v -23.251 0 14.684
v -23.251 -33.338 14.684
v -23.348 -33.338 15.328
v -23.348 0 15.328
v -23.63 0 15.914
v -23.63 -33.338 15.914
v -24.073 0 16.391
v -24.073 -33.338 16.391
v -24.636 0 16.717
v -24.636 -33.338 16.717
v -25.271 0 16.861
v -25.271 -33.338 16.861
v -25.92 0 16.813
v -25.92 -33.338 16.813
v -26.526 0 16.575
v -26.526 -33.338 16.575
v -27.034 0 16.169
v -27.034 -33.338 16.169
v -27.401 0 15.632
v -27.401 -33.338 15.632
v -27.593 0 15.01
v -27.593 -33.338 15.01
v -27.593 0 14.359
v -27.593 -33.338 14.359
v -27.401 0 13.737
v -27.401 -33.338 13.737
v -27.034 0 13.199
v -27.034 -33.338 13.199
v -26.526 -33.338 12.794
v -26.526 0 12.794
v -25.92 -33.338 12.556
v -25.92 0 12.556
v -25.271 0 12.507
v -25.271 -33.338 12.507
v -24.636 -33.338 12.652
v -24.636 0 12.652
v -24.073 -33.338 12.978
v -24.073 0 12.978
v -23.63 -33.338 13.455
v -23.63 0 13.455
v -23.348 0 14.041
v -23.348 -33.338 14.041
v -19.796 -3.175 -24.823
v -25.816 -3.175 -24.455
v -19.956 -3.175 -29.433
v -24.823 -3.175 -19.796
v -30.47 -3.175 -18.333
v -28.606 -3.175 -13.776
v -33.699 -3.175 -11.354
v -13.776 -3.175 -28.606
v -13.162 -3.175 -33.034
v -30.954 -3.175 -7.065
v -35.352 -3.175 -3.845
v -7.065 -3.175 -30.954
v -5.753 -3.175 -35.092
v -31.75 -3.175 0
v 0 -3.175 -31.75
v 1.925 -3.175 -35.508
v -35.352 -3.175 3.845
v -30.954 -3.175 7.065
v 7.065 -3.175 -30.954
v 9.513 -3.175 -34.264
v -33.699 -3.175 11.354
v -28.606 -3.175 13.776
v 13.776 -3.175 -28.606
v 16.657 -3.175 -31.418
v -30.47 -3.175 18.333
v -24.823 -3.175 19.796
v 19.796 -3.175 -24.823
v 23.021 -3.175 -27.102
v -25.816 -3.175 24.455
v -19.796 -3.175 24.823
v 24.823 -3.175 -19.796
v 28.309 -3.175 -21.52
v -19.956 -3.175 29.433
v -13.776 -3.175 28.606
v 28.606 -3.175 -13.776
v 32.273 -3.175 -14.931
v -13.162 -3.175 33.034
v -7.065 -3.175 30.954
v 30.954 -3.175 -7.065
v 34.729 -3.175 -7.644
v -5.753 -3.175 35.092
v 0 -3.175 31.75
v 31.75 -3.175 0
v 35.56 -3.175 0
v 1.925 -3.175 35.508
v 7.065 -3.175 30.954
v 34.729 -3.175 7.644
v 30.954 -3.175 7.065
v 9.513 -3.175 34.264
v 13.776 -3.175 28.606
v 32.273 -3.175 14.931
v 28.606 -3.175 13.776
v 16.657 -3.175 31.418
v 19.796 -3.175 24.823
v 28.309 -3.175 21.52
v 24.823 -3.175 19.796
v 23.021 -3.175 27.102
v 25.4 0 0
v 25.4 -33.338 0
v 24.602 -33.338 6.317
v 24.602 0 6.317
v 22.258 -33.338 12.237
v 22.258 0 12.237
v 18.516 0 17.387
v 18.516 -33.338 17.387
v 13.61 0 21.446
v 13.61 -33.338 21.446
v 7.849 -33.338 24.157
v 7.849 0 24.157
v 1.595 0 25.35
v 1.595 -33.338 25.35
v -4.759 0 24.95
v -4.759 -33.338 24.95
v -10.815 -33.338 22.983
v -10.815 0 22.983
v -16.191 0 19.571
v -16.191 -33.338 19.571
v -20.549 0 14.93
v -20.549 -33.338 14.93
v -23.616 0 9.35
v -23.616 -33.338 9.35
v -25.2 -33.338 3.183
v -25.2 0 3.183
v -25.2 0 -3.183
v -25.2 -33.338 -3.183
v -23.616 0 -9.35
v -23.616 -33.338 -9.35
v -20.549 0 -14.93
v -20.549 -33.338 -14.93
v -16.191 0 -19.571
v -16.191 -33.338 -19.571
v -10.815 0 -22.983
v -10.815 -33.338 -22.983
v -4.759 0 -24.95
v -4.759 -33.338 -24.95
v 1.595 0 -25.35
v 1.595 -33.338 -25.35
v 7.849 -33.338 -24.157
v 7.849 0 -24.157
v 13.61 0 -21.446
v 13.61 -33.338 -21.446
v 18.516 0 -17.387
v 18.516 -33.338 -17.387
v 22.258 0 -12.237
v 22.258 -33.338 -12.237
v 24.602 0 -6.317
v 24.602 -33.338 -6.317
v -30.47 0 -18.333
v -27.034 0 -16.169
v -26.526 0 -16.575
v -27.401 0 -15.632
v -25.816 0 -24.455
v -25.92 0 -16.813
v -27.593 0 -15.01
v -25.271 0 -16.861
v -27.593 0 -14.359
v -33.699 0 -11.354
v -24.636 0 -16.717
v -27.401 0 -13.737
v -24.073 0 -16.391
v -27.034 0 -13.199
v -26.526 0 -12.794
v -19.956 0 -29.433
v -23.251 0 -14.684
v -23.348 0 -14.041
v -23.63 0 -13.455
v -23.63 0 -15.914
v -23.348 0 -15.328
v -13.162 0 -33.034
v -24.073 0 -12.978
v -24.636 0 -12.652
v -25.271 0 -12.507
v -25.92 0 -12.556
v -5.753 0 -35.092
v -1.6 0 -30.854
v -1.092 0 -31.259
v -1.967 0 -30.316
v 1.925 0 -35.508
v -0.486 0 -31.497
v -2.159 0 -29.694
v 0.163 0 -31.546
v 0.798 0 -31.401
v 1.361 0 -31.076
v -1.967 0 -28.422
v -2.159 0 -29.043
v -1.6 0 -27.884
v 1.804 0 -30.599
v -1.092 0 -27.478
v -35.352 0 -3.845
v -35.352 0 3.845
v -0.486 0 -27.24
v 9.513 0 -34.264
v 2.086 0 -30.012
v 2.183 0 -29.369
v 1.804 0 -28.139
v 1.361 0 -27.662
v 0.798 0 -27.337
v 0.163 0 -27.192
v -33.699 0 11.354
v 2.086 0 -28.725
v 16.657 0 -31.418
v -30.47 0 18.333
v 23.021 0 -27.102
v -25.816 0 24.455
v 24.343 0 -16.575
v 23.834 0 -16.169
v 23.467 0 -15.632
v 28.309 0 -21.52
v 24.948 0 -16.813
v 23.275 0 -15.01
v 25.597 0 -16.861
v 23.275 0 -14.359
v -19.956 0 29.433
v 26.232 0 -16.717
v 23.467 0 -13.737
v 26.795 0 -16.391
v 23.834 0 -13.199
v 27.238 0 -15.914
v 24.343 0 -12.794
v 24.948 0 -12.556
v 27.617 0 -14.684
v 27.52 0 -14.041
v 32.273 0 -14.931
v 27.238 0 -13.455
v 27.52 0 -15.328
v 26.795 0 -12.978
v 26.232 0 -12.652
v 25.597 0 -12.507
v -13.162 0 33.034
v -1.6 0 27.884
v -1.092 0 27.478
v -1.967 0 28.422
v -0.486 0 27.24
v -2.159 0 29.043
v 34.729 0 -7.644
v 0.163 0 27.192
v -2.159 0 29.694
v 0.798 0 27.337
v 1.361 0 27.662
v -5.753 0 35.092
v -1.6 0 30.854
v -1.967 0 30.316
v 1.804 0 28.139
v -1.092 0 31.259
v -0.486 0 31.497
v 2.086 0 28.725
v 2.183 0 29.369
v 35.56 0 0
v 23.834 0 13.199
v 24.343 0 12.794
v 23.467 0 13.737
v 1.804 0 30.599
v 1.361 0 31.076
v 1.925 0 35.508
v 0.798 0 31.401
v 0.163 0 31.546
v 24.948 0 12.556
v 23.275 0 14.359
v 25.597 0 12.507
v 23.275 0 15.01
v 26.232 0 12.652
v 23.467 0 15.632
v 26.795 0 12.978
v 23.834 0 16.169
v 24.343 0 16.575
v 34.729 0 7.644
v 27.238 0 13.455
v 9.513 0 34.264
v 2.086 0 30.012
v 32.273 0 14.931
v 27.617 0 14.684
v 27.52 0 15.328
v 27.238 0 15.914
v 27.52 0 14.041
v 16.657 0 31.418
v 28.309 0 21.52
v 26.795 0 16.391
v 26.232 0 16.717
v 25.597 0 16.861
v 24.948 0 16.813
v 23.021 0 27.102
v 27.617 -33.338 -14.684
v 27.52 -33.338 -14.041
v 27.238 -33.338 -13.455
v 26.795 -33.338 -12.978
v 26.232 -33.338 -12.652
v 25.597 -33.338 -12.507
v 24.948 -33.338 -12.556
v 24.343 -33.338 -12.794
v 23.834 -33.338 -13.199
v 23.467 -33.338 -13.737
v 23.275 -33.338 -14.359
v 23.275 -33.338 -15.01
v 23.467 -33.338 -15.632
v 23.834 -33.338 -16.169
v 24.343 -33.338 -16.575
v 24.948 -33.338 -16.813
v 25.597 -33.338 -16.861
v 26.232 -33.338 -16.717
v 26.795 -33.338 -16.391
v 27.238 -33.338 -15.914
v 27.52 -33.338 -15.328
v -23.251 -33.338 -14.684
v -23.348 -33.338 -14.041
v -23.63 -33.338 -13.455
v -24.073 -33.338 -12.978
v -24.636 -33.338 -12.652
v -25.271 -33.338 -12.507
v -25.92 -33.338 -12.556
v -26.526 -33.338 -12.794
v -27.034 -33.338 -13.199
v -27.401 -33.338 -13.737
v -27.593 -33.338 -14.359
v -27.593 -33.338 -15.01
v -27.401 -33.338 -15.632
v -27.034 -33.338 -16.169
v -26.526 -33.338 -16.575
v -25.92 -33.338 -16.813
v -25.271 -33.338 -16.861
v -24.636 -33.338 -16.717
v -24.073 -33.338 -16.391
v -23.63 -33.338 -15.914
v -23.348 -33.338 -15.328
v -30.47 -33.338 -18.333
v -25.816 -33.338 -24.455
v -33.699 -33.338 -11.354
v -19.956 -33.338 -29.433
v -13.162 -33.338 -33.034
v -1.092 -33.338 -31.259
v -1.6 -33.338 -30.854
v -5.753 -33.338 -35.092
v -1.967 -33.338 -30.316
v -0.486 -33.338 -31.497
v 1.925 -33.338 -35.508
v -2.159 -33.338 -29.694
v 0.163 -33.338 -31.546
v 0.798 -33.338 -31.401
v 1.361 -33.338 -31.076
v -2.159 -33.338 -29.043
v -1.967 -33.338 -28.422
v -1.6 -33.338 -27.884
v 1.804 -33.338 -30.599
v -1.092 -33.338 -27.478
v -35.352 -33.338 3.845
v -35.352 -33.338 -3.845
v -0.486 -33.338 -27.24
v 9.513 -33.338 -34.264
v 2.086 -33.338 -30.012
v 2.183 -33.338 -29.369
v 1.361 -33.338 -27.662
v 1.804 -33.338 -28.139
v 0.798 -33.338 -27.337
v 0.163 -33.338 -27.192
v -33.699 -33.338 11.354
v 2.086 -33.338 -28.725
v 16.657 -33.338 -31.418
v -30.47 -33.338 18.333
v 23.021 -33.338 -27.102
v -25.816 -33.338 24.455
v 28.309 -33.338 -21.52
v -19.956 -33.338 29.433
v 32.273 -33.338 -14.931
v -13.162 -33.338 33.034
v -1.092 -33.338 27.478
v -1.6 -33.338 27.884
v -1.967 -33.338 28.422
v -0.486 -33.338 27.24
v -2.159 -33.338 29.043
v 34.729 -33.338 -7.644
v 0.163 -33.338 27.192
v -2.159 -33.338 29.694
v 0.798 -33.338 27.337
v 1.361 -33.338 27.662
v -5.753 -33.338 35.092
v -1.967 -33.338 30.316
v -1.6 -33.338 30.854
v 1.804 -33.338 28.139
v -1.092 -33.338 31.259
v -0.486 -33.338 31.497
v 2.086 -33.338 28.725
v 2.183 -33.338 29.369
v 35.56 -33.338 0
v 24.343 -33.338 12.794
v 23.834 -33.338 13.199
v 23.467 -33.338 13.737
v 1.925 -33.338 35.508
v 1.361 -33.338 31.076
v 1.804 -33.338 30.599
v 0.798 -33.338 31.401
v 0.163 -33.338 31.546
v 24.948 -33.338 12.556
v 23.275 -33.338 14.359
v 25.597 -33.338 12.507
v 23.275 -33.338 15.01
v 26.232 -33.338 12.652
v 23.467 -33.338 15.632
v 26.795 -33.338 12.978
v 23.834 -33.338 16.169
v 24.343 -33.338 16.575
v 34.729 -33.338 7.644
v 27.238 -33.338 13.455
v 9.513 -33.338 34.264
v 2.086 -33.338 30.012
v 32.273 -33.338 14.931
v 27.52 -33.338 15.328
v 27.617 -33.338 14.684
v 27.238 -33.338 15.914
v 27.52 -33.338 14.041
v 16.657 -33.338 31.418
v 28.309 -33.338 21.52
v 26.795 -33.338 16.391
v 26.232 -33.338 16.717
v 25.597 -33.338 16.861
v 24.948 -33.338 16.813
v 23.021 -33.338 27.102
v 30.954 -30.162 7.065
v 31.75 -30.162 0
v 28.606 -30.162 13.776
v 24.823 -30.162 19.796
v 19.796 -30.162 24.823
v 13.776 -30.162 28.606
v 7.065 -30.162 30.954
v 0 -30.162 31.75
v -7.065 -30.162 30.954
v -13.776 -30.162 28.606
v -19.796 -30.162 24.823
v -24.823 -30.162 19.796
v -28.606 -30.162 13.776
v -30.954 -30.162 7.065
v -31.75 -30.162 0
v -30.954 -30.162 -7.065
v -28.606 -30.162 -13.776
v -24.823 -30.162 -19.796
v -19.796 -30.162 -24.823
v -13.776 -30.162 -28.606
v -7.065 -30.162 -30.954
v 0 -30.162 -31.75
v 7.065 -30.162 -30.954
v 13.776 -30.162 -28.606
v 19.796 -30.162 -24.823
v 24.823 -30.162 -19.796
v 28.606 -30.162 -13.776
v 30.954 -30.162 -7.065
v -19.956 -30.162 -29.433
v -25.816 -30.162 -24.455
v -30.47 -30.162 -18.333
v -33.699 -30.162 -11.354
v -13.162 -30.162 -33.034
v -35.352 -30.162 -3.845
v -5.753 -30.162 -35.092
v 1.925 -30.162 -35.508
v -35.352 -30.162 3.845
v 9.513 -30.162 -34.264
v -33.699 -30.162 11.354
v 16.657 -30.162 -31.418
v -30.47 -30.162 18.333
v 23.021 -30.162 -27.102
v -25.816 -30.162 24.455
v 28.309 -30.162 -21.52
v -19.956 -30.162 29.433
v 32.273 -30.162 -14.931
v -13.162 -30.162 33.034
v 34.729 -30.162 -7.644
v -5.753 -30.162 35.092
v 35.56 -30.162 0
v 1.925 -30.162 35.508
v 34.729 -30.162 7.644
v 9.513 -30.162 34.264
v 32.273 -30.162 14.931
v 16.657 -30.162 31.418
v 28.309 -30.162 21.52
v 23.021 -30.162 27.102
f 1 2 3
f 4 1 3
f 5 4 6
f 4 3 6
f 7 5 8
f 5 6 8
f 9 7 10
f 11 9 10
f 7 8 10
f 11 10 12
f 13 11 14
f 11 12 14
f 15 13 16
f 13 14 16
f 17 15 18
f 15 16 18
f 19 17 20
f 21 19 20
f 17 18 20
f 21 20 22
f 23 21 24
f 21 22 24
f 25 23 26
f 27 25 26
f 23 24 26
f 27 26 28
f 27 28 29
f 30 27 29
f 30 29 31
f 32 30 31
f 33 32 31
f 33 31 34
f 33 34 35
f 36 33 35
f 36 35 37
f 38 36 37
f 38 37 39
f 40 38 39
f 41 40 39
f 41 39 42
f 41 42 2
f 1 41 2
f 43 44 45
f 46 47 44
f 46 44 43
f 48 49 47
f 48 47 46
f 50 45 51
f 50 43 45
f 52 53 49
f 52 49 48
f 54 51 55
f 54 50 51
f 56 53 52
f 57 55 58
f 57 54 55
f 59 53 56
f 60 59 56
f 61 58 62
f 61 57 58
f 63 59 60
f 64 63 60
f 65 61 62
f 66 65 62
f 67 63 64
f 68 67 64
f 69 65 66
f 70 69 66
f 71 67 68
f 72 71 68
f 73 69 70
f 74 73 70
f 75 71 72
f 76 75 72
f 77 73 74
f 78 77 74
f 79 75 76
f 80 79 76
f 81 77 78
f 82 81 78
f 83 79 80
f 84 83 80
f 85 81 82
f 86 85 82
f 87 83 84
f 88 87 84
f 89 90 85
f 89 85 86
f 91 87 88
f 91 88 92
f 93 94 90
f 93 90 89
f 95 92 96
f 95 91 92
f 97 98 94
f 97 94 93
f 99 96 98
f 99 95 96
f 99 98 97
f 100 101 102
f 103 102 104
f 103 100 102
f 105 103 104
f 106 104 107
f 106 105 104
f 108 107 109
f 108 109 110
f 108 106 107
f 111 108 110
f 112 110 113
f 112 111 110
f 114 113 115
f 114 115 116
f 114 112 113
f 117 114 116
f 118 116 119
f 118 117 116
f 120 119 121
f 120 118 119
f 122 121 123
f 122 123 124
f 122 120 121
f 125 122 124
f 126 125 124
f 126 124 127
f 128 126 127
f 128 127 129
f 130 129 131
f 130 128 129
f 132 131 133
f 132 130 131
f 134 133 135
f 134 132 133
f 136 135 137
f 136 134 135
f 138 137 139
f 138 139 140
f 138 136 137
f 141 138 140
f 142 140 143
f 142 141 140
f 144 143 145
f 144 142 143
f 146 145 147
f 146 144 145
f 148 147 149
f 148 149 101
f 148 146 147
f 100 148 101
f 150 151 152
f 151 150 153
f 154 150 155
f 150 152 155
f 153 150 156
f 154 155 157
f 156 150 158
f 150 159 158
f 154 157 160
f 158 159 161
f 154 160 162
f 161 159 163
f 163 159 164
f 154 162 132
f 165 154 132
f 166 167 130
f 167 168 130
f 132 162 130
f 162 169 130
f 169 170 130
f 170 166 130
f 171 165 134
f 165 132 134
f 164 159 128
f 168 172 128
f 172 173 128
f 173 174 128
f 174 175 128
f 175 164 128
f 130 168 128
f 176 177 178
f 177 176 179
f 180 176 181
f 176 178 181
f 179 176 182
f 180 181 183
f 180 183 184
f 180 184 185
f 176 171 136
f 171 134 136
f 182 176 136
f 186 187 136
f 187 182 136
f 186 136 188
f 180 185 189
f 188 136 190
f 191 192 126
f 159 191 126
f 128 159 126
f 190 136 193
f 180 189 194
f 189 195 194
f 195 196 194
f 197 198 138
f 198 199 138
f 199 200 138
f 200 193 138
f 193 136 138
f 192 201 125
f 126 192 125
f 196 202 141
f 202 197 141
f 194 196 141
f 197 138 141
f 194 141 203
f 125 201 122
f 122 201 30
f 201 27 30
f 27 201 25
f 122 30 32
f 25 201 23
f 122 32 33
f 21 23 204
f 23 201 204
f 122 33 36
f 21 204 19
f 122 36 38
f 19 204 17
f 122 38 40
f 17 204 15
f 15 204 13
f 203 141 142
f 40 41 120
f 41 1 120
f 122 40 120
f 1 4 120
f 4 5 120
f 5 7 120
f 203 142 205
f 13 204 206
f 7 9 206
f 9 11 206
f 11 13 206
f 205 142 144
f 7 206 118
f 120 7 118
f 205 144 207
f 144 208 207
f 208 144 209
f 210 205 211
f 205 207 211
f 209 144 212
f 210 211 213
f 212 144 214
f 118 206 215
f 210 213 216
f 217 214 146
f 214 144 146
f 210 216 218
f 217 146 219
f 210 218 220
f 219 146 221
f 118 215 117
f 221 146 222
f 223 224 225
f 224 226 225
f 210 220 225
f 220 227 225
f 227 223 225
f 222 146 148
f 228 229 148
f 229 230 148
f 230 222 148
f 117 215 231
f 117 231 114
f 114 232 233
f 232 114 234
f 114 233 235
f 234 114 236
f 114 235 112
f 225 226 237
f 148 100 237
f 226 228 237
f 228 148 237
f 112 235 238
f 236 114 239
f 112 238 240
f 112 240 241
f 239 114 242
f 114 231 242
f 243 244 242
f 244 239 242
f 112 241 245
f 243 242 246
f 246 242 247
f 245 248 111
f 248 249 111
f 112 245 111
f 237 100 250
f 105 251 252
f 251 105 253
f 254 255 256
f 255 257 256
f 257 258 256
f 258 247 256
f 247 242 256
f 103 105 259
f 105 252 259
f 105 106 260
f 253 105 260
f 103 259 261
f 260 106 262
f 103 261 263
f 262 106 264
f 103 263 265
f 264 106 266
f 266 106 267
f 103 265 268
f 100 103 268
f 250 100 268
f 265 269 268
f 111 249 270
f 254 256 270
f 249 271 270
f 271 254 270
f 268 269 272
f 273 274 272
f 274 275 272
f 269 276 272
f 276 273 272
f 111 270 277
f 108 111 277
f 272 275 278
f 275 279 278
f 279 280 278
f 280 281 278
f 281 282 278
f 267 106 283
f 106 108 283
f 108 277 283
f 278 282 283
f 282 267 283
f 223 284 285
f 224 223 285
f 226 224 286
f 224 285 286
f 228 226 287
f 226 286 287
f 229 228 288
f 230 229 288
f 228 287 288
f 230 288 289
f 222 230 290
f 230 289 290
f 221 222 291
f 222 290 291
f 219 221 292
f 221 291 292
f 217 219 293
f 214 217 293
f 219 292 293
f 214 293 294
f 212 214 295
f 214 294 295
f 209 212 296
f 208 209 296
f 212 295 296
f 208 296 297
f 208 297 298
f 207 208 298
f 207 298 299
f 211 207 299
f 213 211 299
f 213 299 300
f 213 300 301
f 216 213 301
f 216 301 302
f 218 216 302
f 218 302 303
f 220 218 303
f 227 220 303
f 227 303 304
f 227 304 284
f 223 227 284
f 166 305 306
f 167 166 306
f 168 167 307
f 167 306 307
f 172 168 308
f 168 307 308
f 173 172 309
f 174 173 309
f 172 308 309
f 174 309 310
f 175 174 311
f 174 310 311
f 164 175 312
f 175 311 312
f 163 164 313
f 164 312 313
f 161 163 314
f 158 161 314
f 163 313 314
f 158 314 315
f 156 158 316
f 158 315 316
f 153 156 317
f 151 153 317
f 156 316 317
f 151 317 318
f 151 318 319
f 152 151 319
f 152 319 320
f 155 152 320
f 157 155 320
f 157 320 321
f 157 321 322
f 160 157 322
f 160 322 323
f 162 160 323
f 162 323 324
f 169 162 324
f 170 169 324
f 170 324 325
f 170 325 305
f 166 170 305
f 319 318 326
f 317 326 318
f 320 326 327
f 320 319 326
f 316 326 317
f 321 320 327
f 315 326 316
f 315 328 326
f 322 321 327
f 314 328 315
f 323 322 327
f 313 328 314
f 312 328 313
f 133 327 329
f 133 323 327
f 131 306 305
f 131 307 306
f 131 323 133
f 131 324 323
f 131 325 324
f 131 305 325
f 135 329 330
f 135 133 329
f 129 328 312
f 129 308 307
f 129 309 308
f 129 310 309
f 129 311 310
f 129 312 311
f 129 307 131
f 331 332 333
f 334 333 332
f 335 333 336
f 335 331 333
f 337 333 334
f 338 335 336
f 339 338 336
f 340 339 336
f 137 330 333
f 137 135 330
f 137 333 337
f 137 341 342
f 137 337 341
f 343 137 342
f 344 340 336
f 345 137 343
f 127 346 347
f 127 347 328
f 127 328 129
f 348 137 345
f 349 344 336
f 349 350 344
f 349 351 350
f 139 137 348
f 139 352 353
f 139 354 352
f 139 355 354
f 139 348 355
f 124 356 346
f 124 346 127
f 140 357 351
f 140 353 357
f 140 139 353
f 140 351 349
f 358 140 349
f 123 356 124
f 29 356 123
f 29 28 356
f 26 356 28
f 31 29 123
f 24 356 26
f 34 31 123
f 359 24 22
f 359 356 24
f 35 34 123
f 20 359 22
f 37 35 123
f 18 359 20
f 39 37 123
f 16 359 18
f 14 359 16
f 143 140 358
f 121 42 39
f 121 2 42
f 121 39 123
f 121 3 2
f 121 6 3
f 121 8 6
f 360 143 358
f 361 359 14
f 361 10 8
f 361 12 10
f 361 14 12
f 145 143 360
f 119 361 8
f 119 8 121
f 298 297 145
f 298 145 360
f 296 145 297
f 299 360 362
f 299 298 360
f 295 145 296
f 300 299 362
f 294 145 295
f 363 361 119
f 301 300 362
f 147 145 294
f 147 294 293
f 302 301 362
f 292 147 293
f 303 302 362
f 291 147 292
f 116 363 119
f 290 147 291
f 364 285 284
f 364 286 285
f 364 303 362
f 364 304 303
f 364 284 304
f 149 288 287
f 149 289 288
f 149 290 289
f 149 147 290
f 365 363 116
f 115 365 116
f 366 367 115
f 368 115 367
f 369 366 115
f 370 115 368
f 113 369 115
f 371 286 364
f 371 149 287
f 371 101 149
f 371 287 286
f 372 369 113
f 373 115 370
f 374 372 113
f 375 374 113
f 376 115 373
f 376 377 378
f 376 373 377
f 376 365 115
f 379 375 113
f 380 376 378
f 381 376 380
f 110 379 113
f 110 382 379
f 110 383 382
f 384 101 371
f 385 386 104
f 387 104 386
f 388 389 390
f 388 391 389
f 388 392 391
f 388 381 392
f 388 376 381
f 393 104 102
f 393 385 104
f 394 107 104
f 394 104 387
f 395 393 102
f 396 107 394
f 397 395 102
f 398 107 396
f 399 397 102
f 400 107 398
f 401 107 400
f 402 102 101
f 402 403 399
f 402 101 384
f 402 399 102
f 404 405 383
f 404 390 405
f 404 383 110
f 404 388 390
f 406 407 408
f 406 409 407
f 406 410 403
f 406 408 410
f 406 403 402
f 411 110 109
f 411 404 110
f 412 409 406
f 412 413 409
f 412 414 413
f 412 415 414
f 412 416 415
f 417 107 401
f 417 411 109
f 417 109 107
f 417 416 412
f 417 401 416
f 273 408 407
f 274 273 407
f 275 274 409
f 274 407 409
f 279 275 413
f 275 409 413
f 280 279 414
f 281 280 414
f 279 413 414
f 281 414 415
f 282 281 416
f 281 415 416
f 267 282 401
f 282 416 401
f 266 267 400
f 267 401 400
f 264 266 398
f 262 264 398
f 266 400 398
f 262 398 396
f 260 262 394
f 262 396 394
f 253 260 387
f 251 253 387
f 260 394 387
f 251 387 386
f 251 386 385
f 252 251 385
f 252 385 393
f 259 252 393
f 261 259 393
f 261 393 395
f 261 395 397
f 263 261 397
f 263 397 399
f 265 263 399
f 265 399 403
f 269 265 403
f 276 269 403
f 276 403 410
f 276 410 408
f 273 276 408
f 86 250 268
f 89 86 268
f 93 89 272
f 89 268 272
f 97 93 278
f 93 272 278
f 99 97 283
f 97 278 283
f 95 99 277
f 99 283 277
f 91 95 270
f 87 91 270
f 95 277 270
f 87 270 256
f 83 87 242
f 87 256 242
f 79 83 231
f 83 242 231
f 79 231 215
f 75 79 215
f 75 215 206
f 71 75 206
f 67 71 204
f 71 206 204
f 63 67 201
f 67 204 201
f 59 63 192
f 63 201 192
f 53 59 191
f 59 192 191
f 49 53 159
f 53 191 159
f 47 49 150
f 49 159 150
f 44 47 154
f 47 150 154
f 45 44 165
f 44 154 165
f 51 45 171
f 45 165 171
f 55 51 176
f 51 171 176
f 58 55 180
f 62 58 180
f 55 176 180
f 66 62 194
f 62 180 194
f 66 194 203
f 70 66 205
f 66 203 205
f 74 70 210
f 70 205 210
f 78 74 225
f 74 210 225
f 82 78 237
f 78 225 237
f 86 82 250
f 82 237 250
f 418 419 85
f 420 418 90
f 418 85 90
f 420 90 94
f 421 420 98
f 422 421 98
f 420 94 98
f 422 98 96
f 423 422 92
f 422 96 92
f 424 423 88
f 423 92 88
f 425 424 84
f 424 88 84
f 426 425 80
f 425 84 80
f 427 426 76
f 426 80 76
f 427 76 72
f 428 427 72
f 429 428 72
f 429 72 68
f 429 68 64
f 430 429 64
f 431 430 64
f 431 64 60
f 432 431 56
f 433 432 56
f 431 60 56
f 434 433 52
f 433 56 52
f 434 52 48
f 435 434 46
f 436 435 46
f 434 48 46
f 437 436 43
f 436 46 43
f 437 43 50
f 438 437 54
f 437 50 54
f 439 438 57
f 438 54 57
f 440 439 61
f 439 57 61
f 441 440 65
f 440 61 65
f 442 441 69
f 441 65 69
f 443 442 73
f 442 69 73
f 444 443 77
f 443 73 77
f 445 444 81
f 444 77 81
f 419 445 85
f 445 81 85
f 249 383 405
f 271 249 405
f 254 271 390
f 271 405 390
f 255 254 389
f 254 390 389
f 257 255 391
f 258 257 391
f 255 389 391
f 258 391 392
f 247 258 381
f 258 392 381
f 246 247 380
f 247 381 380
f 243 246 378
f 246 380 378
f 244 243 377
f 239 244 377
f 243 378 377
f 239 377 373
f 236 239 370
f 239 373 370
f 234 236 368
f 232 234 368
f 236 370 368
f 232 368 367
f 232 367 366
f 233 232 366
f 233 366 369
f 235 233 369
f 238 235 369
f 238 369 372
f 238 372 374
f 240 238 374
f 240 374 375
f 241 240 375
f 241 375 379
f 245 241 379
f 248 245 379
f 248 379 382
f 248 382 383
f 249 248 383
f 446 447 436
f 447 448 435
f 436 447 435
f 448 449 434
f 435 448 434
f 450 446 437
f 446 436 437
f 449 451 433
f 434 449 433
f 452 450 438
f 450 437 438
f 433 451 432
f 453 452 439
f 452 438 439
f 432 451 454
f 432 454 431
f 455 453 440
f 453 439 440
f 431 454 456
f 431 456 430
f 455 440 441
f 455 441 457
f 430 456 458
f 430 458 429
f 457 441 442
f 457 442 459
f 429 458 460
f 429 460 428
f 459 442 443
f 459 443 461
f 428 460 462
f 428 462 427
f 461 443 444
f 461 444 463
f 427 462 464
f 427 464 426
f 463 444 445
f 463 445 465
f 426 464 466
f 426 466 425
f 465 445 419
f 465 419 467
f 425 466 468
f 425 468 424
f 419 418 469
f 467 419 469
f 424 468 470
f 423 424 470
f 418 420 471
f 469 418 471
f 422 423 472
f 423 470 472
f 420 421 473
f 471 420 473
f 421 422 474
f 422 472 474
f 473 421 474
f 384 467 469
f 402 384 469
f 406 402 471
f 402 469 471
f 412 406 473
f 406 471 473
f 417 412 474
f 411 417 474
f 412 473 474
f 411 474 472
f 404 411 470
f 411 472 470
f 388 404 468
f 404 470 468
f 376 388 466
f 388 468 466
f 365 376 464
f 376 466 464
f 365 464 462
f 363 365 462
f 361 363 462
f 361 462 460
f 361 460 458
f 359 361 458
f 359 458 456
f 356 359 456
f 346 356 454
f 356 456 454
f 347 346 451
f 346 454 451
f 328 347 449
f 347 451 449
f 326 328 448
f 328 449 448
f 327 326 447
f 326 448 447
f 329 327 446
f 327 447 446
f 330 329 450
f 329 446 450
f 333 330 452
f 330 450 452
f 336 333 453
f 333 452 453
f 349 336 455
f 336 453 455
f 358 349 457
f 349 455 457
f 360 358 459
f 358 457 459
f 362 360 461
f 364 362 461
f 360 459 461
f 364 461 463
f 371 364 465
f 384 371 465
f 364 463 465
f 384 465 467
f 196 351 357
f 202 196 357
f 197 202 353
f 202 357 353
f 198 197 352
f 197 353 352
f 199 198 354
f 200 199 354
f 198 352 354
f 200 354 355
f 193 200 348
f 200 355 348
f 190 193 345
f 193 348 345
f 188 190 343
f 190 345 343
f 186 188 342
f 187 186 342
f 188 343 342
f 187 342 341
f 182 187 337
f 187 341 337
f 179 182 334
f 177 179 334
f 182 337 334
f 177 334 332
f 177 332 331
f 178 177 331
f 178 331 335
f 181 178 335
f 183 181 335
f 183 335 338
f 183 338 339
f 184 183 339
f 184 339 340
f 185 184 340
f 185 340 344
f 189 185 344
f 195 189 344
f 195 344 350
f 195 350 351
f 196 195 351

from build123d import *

# Parameters (mm, degrees)
F0_R     = 35.56
F0_R_2   = 25.4
F1_DEPTH = 3.175
F2_R     = 31.75
F2_R_2   = 25.4
F3_DEPTH = 26.9875
F4_R     = 35.56
F4_R_2   = 25.4
F5_DEPTH = 3.175
F6_R     = 2.18313
F7_DEPTH = 33.3385


with BuildPart() as f1:
    # F0 (on Front) → F1 (new body)
    with BuildSketch(Plane.XZ):
        Circle(F0_R)
        Circle(F0_R_2, mode=Mode.SUBTRACT)
    extrude(amount=F1_DEPTH)

    # F2 (on face) → F3 (join)
    with BuildSketch(Plane.XZ.offset(3.175)):
        Circle(F2_R)
        Circle(F2_R_2, mode=Mode.SUBTRACT)
    extrude(amount=F3_DEPTH)

    # F4 (on face) → F5 (join)
    with BuildSketch(Plane.XZ.offset(30.1625)):
        Circle(F4_R)
        Circle(F4_R_2, mode=Mode.SUBTRACT)
    extrude(amount=F5_DEPTH)

    # F6 (on face) → F7 (cut, through all)
    with BuildSketch(Plane.XZ.offset(33.3375)):
        with Locations((0, 29.36875)):
            Circle(F6_R)
        with Locations((-25.434084, 14.684375)):
            Circle(F6_R)
        with Locations((-25.434084, -14.684375)):
            Circle(F6_R)
        with Locations((0, -29.36875)):
            Circle(F6_R)
        with Locations((25.434084, -14.684375)):
            Circle(F6_R)
        with Locations((25.434084, 14.684375)):
            Circle(F6_R)
    extrude(amount=-F7_DEPTH, mode=Mode.SUBTRACT)


solid = f1.part
